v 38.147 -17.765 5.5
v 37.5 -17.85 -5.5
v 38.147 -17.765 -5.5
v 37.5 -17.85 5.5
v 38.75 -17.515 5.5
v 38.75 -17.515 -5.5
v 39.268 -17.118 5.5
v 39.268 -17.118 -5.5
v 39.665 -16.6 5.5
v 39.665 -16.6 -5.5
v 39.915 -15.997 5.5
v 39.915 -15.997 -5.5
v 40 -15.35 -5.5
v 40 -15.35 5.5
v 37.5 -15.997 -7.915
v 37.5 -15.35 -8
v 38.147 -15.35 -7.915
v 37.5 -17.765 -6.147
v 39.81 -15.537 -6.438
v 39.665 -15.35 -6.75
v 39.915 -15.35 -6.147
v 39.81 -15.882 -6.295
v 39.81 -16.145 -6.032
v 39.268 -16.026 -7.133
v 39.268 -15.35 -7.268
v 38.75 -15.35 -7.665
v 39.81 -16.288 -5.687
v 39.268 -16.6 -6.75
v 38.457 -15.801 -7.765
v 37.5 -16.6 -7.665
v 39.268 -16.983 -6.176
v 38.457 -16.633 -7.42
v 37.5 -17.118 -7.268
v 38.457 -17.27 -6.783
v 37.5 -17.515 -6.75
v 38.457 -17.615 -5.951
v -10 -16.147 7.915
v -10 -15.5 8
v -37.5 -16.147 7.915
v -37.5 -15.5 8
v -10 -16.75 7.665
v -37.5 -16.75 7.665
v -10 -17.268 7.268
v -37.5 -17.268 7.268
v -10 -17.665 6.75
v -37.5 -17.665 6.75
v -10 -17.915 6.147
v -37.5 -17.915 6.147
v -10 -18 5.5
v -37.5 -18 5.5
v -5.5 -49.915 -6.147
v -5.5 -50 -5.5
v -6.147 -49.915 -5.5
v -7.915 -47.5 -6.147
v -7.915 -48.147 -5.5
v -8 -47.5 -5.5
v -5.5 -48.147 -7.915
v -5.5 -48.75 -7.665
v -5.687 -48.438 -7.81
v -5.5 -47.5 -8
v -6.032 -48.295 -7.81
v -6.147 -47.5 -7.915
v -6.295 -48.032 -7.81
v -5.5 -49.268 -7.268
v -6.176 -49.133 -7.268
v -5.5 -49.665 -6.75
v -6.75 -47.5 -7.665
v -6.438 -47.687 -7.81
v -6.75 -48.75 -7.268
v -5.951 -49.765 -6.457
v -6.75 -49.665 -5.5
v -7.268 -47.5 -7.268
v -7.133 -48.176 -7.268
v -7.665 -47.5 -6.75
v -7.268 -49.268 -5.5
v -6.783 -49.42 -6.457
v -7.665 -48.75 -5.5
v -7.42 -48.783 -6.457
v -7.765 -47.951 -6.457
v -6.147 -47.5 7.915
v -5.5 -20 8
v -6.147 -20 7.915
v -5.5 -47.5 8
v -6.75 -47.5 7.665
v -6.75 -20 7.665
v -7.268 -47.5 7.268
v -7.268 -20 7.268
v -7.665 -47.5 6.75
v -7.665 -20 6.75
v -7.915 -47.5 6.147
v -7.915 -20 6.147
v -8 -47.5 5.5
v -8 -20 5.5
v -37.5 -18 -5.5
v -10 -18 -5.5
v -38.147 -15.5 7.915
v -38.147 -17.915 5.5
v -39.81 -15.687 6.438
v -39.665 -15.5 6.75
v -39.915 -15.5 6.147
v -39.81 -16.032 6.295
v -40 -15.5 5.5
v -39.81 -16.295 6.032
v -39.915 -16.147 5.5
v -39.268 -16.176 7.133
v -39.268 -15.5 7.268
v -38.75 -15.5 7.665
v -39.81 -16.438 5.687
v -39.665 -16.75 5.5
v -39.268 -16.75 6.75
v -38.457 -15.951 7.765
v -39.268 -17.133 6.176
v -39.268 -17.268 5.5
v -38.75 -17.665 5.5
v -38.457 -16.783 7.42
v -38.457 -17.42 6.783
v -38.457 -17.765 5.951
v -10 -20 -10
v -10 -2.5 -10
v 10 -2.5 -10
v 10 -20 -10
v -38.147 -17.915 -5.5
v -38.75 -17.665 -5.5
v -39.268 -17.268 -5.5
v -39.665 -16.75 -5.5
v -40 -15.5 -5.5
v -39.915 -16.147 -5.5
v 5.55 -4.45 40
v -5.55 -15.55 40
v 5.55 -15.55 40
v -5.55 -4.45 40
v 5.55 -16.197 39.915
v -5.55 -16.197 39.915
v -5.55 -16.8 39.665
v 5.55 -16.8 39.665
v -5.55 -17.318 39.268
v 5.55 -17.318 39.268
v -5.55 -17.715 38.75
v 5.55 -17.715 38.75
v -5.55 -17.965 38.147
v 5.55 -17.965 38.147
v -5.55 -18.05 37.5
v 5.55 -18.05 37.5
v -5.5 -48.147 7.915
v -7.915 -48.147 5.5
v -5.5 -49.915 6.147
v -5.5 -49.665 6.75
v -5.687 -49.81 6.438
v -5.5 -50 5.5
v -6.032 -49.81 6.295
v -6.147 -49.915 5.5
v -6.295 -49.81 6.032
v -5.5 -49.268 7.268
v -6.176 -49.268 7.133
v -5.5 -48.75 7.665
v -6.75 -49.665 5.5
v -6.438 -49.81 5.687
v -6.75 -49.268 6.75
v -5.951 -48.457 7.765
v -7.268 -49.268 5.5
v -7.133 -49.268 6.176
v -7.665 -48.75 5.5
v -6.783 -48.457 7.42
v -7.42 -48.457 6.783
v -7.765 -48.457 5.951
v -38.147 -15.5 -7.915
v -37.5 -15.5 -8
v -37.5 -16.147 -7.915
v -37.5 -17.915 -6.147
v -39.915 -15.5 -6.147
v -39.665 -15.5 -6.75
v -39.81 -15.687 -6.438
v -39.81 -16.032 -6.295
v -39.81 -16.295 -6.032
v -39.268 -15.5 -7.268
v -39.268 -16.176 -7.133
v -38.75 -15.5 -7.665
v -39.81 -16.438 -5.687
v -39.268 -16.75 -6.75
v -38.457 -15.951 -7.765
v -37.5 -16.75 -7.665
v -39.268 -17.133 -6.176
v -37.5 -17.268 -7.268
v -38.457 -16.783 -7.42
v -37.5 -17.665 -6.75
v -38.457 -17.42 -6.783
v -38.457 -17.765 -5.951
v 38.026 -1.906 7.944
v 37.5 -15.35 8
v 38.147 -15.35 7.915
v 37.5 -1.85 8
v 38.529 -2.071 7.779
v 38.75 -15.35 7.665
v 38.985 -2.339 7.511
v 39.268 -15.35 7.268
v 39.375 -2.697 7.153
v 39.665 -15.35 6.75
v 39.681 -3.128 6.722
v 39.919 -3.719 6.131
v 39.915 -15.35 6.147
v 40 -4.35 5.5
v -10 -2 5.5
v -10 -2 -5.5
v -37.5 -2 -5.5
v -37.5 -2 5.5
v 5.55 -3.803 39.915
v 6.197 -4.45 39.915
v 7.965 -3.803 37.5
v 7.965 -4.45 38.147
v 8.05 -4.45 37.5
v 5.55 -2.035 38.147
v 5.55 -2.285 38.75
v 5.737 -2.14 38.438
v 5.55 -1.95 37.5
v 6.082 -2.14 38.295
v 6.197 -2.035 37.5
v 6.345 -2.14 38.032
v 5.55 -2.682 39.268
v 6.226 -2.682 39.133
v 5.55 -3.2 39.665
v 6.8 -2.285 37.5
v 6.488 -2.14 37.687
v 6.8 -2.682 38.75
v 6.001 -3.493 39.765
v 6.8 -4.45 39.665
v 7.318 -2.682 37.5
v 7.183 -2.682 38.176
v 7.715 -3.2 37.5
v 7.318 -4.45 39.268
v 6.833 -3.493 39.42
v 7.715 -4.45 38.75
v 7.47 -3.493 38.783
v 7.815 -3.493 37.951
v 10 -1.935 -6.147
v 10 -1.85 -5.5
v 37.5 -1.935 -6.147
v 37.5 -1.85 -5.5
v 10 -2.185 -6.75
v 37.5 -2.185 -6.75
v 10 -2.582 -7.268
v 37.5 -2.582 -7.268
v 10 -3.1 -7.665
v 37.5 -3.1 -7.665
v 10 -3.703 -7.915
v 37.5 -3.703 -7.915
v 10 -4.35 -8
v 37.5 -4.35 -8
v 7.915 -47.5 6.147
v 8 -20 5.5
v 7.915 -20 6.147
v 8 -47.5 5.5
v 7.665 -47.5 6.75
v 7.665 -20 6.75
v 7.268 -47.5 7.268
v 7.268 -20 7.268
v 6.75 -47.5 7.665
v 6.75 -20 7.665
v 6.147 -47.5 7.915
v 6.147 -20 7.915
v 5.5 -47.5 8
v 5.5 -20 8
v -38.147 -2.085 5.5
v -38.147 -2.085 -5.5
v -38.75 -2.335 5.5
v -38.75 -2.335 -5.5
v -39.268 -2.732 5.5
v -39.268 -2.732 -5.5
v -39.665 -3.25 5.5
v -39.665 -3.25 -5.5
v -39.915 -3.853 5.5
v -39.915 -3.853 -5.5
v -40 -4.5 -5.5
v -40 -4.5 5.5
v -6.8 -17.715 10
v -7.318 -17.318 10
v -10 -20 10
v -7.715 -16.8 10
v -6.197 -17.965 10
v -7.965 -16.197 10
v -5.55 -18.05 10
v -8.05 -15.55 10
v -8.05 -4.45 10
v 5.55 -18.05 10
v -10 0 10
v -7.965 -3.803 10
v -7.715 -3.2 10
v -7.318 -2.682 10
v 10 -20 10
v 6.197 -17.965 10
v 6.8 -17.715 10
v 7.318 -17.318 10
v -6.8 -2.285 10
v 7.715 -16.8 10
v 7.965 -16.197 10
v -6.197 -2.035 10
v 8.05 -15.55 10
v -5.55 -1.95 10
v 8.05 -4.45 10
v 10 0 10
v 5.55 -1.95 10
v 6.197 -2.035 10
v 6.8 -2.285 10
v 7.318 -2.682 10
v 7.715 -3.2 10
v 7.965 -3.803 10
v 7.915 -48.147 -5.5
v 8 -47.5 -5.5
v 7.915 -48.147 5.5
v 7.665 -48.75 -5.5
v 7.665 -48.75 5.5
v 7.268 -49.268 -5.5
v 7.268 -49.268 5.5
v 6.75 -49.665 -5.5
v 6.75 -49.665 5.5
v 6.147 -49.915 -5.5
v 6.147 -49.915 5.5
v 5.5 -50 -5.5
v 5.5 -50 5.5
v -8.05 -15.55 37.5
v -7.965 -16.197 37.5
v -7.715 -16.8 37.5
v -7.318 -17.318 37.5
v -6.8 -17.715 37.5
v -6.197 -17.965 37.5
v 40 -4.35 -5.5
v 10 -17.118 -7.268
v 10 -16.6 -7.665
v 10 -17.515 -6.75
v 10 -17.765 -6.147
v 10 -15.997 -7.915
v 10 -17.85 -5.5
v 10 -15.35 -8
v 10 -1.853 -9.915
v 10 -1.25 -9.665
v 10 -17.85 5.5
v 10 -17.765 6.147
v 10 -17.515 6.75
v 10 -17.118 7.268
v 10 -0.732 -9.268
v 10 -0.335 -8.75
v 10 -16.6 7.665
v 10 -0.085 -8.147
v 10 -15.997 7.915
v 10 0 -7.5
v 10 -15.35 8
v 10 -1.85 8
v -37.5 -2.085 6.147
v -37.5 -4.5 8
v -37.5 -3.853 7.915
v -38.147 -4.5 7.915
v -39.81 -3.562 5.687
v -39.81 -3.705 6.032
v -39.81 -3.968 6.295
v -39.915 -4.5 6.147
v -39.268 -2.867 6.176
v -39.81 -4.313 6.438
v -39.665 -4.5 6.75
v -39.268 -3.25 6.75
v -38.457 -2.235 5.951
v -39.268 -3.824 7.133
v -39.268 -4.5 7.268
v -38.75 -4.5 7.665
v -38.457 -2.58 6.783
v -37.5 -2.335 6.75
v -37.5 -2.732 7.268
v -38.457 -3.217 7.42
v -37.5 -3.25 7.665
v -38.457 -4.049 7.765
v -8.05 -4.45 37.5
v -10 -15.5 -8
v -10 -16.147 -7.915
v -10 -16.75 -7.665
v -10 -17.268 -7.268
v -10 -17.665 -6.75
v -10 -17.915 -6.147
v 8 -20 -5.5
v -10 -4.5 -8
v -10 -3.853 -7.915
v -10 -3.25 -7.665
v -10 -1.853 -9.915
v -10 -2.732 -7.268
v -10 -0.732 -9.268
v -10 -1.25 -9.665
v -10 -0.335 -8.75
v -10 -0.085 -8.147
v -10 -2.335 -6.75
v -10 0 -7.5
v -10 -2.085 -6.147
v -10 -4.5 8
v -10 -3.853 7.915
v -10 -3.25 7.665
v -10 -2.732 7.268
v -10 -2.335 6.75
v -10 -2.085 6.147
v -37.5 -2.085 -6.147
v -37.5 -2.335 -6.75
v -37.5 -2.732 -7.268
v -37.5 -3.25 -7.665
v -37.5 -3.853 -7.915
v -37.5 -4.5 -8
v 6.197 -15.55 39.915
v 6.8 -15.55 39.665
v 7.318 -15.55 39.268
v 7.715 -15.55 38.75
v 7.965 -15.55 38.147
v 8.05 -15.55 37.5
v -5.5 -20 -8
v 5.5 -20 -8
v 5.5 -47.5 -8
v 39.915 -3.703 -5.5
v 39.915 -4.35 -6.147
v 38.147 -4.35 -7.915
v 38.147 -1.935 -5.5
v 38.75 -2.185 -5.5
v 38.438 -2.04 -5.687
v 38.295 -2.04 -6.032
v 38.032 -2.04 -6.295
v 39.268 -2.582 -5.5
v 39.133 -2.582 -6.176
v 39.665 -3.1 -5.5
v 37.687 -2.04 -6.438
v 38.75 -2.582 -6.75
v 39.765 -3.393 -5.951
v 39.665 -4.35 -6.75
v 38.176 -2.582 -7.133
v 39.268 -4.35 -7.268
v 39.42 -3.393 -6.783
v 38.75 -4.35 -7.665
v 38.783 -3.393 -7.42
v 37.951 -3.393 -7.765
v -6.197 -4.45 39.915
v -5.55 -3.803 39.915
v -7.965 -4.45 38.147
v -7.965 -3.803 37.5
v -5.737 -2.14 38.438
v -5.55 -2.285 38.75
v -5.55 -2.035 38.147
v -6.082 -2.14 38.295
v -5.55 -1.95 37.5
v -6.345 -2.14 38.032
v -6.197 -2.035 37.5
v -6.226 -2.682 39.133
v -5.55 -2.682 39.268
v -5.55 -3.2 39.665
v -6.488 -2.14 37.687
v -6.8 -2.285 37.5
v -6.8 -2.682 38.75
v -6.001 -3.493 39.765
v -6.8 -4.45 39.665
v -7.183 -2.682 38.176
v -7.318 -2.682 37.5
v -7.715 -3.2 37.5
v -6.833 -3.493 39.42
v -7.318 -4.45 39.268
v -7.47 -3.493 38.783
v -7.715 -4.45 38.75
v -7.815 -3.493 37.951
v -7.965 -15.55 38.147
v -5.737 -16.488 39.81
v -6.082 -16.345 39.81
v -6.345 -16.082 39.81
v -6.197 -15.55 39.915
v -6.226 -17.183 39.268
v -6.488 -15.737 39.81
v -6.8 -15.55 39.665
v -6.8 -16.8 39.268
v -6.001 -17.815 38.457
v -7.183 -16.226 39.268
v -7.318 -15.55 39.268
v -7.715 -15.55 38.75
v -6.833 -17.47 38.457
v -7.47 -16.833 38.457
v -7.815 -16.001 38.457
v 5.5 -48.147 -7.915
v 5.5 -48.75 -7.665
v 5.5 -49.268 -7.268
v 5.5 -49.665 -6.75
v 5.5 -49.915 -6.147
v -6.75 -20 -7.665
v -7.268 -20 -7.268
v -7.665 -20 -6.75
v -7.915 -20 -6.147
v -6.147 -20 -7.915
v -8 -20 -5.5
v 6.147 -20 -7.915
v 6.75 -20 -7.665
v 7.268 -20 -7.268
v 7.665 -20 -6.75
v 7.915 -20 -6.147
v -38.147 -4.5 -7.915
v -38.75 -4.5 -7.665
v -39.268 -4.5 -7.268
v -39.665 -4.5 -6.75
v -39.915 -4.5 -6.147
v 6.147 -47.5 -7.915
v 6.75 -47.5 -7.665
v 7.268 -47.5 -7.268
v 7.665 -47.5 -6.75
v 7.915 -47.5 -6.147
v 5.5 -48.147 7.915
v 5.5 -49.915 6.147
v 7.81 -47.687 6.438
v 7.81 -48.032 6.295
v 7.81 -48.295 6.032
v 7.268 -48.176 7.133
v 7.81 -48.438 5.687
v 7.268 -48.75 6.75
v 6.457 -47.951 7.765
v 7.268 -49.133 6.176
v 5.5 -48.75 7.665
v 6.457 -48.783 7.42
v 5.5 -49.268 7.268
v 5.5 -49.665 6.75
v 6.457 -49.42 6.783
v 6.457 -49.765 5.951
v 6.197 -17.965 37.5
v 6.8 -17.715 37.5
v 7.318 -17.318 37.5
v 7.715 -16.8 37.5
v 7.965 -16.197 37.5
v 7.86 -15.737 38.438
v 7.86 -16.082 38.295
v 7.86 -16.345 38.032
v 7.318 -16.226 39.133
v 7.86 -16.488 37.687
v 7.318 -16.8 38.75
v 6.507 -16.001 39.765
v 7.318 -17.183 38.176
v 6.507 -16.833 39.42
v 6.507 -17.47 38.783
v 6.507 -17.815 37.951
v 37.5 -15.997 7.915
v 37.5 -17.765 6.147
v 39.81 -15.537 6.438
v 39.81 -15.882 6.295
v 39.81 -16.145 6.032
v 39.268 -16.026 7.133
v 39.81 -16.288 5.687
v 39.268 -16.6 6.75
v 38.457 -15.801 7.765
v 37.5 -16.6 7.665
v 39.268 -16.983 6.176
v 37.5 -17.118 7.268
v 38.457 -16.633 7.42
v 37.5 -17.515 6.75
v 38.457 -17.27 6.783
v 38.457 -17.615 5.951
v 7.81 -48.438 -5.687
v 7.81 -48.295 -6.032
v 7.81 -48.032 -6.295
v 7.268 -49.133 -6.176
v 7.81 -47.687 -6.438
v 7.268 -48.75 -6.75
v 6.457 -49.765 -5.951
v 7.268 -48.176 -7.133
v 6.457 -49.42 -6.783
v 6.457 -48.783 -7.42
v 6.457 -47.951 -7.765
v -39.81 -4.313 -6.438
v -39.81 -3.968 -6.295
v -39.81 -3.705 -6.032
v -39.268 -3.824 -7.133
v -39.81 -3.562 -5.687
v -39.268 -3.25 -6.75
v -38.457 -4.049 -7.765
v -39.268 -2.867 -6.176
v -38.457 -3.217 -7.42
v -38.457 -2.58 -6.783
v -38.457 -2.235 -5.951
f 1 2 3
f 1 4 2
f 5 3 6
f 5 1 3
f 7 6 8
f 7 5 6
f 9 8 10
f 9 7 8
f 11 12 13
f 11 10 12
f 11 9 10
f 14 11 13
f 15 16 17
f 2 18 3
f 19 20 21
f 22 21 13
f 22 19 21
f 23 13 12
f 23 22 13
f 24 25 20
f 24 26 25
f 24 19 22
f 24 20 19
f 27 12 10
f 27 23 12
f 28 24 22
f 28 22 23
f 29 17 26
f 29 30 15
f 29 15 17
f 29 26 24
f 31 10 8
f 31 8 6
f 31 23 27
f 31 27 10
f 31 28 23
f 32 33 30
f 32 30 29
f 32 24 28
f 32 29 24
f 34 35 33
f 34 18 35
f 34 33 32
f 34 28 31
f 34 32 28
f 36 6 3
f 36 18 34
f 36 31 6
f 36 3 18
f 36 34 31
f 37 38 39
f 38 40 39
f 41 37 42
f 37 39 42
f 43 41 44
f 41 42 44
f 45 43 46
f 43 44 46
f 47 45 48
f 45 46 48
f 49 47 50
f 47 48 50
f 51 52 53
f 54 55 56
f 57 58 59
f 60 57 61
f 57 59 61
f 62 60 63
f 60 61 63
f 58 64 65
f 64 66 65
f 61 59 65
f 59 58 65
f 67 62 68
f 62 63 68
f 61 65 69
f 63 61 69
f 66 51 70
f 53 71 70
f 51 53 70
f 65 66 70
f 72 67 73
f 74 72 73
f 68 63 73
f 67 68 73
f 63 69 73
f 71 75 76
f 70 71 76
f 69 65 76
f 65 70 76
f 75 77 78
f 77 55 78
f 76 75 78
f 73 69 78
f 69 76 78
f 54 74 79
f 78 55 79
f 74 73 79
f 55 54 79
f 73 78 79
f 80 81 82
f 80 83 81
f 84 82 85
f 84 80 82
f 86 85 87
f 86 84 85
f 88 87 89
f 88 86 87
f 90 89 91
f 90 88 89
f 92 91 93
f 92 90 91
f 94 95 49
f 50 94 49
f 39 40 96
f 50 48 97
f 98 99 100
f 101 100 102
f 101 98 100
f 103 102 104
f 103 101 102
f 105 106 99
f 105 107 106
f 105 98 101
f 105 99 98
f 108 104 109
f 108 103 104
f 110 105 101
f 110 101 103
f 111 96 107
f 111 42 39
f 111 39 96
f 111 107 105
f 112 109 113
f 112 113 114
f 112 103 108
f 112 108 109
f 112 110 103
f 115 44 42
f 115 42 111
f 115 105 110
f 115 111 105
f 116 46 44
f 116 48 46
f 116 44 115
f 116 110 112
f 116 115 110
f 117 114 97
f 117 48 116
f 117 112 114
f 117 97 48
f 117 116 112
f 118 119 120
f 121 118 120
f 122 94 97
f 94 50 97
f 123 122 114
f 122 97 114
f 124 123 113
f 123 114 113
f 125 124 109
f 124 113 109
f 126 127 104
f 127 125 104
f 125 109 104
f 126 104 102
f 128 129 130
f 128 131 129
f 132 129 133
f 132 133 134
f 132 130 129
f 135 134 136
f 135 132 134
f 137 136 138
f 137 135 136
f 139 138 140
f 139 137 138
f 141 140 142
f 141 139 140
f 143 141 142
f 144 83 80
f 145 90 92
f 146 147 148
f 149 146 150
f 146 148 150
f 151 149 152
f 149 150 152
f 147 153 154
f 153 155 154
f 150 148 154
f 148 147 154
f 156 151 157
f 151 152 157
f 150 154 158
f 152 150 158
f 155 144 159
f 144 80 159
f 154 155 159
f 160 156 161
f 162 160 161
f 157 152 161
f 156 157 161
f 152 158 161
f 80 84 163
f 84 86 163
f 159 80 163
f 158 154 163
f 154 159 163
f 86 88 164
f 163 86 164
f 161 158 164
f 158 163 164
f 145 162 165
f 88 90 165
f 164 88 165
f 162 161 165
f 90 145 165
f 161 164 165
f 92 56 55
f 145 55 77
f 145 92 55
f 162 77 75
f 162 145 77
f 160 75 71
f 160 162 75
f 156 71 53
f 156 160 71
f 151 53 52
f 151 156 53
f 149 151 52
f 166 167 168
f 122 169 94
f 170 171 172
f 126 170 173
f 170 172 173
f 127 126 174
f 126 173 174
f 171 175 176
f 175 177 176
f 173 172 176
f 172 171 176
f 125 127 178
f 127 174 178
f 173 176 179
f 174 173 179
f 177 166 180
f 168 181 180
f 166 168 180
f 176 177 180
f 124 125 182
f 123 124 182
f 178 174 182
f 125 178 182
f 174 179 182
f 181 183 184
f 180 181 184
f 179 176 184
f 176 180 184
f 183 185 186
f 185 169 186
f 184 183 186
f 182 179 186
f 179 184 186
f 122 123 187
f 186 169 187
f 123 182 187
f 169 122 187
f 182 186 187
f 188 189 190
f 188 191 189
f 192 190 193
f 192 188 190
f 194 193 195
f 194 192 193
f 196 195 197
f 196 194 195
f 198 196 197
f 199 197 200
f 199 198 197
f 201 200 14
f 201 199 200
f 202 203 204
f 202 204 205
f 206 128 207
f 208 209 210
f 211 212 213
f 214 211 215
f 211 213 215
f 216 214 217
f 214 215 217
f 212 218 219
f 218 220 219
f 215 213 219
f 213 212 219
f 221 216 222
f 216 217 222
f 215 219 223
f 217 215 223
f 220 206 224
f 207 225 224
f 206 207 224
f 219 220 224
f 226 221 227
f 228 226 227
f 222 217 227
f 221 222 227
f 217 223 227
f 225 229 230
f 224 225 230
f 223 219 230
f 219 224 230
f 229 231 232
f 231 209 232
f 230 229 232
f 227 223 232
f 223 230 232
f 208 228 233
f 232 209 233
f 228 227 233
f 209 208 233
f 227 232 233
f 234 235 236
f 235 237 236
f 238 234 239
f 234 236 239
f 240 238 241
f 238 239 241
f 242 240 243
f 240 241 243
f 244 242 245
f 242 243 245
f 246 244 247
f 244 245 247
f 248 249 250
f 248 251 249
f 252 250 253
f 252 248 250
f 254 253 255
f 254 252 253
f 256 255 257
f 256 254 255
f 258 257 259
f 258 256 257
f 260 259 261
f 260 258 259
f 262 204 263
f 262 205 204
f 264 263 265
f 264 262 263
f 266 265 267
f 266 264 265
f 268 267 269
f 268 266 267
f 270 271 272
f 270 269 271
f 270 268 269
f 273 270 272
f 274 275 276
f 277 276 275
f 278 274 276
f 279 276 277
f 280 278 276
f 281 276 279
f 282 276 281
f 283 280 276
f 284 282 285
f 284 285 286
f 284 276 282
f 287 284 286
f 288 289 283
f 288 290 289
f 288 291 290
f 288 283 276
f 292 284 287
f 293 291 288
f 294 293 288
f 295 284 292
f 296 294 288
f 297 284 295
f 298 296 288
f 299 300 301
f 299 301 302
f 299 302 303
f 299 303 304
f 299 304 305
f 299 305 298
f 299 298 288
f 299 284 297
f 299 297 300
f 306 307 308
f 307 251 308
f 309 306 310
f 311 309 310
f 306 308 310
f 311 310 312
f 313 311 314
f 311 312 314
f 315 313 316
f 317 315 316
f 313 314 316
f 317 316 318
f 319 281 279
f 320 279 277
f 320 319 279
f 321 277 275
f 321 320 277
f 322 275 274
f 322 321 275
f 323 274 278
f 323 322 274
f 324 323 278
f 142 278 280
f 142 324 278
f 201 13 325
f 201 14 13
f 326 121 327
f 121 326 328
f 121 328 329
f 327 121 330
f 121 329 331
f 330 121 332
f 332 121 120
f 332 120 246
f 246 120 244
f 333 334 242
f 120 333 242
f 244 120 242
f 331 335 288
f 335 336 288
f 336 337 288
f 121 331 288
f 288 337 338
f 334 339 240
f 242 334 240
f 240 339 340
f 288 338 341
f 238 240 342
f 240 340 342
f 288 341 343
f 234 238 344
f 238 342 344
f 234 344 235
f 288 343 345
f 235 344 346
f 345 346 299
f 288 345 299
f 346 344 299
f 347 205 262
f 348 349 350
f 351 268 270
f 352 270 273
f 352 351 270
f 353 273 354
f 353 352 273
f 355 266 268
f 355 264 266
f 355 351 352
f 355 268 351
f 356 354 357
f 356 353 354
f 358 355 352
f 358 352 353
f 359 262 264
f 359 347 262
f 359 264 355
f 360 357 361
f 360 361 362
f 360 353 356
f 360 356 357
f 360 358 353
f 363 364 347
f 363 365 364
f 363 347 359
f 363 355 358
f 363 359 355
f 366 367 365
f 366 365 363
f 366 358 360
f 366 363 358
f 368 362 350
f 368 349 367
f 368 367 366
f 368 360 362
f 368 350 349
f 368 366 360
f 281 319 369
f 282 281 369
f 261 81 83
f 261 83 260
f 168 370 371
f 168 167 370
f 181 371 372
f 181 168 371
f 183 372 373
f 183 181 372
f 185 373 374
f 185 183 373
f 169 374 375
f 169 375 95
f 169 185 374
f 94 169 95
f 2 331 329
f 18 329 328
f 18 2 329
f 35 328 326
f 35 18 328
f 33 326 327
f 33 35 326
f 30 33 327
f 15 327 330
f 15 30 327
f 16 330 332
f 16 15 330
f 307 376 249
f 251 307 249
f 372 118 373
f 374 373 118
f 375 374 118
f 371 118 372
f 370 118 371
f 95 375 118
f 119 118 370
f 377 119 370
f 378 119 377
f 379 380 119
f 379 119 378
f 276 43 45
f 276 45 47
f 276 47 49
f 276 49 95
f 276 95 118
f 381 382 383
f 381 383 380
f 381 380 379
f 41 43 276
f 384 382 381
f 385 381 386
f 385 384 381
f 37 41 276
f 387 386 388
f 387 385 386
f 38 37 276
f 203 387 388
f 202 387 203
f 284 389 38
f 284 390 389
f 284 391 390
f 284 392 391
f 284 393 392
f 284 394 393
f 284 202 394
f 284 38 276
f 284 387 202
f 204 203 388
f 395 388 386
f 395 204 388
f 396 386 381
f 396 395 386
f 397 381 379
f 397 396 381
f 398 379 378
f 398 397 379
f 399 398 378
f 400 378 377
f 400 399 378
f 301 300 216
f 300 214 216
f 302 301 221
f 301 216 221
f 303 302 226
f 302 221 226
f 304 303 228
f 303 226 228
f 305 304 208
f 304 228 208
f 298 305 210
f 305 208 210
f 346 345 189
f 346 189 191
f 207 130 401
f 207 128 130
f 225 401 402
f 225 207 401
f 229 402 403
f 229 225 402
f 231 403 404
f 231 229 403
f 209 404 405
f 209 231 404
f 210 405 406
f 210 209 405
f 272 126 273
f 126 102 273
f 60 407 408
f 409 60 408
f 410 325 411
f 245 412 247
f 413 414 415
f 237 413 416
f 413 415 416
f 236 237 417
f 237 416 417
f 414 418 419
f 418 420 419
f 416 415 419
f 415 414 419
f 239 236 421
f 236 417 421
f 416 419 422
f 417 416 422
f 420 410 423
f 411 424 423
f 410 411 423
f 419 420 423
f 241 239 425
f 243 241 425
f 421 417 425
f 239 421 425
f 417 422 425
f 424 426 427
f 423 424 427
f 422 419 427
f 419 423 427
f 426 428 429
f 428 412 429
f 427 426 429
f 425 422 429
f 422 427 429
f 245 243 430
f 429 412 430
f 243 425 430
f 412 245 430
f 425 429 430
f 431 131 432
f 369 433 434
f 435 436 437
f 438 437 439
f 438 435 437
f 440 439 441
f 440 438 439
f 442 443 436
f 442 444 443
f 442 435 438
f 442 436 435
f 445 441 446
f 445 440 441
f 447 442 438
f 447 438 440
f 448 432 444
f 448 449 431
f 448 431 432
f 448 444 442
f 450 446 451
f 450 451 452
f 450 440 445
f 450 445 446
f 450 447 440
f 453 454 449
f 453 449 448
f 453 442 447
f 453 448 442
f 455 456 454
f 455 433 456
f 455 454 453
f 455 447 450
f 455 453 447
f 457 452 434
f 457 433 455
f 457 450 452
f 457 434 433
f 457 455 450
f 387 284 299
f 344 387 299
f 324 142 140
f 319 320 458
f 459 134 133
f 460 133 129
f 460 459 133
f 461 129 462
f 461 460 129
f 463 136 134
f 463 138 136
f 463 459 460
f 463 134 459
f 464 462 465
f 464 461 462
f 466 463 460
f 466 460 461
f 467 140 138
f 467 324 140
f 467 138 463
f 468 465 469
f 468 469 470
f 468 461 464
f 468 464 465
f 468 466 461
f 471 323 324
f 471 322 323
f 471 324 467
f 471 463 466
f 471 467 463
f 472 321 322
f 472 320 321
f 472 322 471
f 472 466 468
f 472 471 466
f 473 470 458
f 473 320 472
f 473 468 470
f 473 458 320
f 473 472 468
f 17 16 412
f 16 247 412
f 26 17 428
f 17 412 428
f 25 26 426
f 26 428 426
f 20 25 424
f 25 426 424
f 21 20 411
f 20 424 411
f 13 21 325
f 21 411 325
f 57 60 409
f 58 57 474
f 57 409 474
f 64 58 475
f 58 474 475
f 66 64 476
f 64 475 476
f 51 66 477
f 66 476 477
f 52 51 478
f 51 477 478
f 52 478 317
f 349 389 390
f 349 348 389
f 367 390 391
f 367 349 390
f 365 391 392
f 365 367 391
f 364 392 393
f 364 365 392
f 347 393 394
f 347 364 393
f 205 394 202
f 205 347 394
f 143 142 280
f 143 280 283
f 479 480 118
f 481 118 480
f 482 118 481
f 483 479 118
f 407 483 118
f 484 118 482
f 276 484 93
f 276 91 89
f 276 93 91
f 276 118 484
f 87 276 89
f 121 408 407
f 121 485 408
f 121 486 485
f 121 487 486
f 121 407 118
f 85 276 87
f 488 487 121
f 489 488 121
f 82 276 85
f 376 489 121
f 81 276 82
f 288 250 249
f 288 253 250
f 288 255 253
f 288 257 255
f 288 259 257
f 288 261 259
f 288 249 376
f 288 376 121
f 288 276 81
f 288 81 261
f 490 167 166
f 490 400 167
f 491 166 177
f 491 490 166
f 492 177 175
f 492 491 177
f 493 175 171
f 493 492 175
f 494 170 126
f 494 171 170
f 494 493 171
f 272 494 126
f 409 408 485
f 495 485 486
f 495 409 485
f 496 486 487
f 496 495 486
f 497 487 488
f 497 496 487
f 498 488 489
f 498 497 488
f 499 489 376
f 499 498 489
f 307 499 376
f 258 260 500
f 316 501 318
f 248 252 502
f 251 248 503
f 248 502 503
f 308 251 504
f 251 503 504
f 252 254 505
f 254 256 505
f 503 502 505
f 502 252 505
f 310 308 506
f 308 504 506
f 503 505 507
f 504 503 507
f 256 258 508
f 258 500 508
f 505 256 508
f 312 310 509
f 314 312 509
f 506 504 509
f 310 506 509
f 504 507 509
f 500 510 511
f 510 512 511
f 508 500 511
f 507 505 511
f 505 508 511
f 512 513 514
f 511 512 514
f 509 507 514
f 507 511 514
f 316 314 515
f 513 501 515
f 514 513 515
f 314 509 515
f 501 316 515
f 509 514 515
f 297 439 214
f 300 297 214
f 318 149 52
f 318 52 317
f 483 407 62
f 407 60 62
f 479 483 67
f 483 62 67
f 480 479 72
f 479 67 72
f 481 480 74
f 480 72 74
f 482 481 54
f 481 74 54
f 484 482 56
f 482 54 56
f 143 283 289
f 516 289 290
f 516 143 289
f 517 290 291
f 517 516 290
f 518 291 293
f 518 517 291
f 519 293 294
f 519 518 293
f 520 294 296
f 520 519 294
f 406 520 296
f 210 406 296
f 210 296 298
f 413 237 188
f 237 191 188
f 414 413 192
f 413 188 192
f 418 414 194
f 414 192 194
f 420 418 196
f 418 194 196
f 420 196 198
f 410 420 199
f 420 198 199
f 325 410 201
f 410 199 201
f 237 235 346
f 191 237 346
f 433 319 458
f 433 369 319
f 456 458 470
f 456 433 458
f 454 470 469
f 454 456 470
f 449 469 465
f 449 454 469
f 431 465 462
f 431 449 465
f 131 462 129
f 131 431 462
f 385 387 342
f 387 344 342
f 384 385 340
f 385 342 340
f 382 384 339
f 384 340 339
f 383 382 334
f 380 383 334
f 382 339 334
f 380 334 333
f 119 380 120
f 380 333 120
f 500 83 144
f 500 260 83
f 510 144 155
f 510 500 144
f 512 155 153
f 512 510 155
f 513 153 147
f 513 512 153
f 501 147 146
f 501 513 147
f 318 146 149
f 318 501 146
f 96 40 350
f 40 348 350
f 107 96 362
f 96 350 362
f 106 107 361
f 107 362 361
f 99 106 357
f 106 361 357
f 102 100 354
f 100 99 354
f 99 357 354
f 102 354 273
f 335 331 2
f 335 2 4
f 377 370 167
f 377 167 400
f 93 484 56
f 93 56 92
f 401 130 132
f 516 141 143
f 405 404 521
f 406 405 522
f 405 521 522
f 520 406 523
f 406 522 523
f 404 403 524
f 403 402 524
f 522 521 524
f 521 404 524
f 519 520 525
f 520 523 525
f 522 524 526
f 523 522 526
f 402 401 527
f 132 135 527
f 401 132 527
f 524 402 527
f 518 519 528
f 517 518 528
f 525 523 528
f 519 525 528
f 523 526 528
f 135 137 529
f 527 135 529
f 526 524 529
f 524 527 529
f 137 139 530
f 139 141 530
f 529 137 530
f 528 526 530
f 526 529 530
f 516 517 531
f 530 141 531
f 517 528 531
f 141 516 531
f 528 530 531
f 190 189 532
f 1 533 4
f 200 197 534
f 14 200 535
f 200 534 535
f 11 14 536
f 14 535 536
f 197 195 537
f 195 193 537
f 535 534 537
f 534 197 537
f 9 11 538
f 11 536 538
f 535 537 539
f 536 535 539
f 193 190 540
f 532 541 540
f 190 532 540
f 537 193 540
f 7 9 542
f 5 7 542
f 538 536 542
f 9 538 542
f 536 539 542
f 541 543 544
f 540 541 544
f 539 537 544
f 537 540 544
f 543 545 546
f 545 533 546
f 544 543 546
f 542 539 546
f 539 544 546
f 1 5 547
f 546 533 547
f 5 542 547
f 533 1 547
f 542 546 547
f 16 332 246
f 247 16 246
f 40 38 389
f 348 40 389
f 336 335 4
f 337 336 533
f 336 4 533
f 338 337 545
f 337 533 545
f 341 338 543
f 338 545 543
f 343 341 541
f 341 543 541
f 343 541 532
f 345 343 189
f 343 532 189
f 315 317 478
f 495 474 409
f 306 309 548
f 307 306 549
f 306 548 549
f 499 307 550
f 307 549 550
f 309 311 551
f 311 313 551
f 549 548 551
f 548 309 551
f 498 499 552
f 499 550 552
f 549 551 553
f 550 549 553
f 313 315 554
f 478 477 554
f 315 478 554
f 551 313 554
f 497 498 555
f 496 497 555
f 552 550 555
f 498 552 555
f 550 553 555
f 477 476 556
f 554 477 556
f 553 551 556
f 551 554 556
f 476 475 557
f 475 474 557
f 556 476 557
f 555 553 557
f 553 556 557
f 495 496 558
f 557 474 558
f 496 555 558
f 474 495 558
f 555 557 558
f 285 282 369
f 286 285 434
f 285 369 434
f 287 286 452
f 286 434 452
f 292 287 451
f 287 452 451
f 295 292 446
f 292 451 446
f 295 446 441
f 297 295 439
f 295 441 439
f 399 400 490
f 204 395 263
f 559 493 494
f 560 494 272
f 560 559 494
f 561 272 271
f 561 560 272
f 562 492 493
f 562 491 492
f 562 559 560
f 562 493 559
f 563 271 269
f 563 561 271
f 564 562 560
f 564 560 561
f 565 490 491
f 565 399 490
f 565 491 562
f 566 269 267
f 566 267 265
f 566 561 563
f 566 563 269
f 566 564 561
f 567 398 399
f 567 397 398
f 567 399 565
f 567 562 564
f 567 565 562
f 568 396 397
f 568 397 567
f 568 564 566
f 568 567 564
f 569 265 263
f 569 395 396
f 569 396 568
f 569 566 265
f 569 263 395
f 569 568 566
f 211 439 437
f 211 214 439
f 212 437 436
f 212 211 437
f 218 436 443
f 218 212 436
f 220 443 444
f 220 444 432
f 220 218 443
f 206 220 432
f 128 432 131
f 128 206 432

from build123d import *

# Parameters (mm, degrees)
F0_W     = 16
F0_H     = 16
F1_DEPTH = 50
F0_W_2   = 20
F0_H_2   = 20
F2_DEPTH = 20
F3_W     = 16
F3_H     = 16
F4_DEPTH = 40
F5_W     = 16
F5_H     = 16
F6_DEPTH = 40
F7_W     = 16.1
F7_H     = 16.1
F8_DEPTH = 40
F9_R     = 2.5


with BuildPart() as f1:
    # F0 (on Front) → F1 (new body)
    with BuildSketch(Plane.XZ):
        Rectangle(F0_W, F0_H)
    extrude(amount=F1_DEPTH)

    # F0 (on Front) → F2 (join)
    with BuildSketch(Plane.XZ):
        Rectangle(F0_W_2, F0_H_2)
        Rectangle(F0_W, F0_H, mode=Mode.SUBTRACT)
    extrude(amount=F2_DEPTH)

    # F3 (on Right) → F4 (join)
    with BuildSketch(Plane.YZ):
        with Locations((-9.85, 0)):
            Rectangle(F3_W, F3_H)
    extrude(amount=F4_DEPTH)

    # F5 (on Right) → F6 (join)
    with BuildSketch(Plane.YZ):
        with Locations((-10, 0)):
            Rectangle(F5_W, F5_H)
    extrude(amount=-F6_DEPTH)

    # F7 (on Top) → F8 (join)
    with BuildSketch(Plane.XY):
        with Locations((0, -10)):
            Rectangle(F7_W, F7_H)
    extrude(amount=F8_DEPTH)

    # F9
    f9_edges = [f1.edges().sort_by_distance(p)[0] for p in [
        (0, 0, -10),
        (-25, -2, -8),
        (-25, -18, -8),
        (-25, -2, 8),
        (-25, -18, 8),
        (-40, -10, -8),
        (-40, -2, 0),
        (-40, -10, 8),
        (-40, -18, 0),
        (-8.05, -18.05, 25),
        (0, -18.05, 40),
        (-8.05, -10, 40),
        (8.05, -10, 40),
        (0, -1.95, 40),
        (-8.05, -1.95, 25),
        (8.05, -1.95, 25),
        (8.05, -18.05, 25),
        (-8, -35, 8),
        (0, -50, 8),
        (8, -35, 8),
        (-8, -50, 0),
        (0, -50, -8),
        (8, -50, 0),
        (25, -17.85, 8),
        (25, -17.85, -8),
        (40, -9.85, -8),
        (40, -1.85, 0),
        (40, -9.85, 8),
        (40, -17.85, 0),
        (8, -35, -8),
        (-8, -35, -8),
        (25, -1.85, -8),
    ]]
    fillet(f9_edges, radius=F9_R)


solid = f1.part
